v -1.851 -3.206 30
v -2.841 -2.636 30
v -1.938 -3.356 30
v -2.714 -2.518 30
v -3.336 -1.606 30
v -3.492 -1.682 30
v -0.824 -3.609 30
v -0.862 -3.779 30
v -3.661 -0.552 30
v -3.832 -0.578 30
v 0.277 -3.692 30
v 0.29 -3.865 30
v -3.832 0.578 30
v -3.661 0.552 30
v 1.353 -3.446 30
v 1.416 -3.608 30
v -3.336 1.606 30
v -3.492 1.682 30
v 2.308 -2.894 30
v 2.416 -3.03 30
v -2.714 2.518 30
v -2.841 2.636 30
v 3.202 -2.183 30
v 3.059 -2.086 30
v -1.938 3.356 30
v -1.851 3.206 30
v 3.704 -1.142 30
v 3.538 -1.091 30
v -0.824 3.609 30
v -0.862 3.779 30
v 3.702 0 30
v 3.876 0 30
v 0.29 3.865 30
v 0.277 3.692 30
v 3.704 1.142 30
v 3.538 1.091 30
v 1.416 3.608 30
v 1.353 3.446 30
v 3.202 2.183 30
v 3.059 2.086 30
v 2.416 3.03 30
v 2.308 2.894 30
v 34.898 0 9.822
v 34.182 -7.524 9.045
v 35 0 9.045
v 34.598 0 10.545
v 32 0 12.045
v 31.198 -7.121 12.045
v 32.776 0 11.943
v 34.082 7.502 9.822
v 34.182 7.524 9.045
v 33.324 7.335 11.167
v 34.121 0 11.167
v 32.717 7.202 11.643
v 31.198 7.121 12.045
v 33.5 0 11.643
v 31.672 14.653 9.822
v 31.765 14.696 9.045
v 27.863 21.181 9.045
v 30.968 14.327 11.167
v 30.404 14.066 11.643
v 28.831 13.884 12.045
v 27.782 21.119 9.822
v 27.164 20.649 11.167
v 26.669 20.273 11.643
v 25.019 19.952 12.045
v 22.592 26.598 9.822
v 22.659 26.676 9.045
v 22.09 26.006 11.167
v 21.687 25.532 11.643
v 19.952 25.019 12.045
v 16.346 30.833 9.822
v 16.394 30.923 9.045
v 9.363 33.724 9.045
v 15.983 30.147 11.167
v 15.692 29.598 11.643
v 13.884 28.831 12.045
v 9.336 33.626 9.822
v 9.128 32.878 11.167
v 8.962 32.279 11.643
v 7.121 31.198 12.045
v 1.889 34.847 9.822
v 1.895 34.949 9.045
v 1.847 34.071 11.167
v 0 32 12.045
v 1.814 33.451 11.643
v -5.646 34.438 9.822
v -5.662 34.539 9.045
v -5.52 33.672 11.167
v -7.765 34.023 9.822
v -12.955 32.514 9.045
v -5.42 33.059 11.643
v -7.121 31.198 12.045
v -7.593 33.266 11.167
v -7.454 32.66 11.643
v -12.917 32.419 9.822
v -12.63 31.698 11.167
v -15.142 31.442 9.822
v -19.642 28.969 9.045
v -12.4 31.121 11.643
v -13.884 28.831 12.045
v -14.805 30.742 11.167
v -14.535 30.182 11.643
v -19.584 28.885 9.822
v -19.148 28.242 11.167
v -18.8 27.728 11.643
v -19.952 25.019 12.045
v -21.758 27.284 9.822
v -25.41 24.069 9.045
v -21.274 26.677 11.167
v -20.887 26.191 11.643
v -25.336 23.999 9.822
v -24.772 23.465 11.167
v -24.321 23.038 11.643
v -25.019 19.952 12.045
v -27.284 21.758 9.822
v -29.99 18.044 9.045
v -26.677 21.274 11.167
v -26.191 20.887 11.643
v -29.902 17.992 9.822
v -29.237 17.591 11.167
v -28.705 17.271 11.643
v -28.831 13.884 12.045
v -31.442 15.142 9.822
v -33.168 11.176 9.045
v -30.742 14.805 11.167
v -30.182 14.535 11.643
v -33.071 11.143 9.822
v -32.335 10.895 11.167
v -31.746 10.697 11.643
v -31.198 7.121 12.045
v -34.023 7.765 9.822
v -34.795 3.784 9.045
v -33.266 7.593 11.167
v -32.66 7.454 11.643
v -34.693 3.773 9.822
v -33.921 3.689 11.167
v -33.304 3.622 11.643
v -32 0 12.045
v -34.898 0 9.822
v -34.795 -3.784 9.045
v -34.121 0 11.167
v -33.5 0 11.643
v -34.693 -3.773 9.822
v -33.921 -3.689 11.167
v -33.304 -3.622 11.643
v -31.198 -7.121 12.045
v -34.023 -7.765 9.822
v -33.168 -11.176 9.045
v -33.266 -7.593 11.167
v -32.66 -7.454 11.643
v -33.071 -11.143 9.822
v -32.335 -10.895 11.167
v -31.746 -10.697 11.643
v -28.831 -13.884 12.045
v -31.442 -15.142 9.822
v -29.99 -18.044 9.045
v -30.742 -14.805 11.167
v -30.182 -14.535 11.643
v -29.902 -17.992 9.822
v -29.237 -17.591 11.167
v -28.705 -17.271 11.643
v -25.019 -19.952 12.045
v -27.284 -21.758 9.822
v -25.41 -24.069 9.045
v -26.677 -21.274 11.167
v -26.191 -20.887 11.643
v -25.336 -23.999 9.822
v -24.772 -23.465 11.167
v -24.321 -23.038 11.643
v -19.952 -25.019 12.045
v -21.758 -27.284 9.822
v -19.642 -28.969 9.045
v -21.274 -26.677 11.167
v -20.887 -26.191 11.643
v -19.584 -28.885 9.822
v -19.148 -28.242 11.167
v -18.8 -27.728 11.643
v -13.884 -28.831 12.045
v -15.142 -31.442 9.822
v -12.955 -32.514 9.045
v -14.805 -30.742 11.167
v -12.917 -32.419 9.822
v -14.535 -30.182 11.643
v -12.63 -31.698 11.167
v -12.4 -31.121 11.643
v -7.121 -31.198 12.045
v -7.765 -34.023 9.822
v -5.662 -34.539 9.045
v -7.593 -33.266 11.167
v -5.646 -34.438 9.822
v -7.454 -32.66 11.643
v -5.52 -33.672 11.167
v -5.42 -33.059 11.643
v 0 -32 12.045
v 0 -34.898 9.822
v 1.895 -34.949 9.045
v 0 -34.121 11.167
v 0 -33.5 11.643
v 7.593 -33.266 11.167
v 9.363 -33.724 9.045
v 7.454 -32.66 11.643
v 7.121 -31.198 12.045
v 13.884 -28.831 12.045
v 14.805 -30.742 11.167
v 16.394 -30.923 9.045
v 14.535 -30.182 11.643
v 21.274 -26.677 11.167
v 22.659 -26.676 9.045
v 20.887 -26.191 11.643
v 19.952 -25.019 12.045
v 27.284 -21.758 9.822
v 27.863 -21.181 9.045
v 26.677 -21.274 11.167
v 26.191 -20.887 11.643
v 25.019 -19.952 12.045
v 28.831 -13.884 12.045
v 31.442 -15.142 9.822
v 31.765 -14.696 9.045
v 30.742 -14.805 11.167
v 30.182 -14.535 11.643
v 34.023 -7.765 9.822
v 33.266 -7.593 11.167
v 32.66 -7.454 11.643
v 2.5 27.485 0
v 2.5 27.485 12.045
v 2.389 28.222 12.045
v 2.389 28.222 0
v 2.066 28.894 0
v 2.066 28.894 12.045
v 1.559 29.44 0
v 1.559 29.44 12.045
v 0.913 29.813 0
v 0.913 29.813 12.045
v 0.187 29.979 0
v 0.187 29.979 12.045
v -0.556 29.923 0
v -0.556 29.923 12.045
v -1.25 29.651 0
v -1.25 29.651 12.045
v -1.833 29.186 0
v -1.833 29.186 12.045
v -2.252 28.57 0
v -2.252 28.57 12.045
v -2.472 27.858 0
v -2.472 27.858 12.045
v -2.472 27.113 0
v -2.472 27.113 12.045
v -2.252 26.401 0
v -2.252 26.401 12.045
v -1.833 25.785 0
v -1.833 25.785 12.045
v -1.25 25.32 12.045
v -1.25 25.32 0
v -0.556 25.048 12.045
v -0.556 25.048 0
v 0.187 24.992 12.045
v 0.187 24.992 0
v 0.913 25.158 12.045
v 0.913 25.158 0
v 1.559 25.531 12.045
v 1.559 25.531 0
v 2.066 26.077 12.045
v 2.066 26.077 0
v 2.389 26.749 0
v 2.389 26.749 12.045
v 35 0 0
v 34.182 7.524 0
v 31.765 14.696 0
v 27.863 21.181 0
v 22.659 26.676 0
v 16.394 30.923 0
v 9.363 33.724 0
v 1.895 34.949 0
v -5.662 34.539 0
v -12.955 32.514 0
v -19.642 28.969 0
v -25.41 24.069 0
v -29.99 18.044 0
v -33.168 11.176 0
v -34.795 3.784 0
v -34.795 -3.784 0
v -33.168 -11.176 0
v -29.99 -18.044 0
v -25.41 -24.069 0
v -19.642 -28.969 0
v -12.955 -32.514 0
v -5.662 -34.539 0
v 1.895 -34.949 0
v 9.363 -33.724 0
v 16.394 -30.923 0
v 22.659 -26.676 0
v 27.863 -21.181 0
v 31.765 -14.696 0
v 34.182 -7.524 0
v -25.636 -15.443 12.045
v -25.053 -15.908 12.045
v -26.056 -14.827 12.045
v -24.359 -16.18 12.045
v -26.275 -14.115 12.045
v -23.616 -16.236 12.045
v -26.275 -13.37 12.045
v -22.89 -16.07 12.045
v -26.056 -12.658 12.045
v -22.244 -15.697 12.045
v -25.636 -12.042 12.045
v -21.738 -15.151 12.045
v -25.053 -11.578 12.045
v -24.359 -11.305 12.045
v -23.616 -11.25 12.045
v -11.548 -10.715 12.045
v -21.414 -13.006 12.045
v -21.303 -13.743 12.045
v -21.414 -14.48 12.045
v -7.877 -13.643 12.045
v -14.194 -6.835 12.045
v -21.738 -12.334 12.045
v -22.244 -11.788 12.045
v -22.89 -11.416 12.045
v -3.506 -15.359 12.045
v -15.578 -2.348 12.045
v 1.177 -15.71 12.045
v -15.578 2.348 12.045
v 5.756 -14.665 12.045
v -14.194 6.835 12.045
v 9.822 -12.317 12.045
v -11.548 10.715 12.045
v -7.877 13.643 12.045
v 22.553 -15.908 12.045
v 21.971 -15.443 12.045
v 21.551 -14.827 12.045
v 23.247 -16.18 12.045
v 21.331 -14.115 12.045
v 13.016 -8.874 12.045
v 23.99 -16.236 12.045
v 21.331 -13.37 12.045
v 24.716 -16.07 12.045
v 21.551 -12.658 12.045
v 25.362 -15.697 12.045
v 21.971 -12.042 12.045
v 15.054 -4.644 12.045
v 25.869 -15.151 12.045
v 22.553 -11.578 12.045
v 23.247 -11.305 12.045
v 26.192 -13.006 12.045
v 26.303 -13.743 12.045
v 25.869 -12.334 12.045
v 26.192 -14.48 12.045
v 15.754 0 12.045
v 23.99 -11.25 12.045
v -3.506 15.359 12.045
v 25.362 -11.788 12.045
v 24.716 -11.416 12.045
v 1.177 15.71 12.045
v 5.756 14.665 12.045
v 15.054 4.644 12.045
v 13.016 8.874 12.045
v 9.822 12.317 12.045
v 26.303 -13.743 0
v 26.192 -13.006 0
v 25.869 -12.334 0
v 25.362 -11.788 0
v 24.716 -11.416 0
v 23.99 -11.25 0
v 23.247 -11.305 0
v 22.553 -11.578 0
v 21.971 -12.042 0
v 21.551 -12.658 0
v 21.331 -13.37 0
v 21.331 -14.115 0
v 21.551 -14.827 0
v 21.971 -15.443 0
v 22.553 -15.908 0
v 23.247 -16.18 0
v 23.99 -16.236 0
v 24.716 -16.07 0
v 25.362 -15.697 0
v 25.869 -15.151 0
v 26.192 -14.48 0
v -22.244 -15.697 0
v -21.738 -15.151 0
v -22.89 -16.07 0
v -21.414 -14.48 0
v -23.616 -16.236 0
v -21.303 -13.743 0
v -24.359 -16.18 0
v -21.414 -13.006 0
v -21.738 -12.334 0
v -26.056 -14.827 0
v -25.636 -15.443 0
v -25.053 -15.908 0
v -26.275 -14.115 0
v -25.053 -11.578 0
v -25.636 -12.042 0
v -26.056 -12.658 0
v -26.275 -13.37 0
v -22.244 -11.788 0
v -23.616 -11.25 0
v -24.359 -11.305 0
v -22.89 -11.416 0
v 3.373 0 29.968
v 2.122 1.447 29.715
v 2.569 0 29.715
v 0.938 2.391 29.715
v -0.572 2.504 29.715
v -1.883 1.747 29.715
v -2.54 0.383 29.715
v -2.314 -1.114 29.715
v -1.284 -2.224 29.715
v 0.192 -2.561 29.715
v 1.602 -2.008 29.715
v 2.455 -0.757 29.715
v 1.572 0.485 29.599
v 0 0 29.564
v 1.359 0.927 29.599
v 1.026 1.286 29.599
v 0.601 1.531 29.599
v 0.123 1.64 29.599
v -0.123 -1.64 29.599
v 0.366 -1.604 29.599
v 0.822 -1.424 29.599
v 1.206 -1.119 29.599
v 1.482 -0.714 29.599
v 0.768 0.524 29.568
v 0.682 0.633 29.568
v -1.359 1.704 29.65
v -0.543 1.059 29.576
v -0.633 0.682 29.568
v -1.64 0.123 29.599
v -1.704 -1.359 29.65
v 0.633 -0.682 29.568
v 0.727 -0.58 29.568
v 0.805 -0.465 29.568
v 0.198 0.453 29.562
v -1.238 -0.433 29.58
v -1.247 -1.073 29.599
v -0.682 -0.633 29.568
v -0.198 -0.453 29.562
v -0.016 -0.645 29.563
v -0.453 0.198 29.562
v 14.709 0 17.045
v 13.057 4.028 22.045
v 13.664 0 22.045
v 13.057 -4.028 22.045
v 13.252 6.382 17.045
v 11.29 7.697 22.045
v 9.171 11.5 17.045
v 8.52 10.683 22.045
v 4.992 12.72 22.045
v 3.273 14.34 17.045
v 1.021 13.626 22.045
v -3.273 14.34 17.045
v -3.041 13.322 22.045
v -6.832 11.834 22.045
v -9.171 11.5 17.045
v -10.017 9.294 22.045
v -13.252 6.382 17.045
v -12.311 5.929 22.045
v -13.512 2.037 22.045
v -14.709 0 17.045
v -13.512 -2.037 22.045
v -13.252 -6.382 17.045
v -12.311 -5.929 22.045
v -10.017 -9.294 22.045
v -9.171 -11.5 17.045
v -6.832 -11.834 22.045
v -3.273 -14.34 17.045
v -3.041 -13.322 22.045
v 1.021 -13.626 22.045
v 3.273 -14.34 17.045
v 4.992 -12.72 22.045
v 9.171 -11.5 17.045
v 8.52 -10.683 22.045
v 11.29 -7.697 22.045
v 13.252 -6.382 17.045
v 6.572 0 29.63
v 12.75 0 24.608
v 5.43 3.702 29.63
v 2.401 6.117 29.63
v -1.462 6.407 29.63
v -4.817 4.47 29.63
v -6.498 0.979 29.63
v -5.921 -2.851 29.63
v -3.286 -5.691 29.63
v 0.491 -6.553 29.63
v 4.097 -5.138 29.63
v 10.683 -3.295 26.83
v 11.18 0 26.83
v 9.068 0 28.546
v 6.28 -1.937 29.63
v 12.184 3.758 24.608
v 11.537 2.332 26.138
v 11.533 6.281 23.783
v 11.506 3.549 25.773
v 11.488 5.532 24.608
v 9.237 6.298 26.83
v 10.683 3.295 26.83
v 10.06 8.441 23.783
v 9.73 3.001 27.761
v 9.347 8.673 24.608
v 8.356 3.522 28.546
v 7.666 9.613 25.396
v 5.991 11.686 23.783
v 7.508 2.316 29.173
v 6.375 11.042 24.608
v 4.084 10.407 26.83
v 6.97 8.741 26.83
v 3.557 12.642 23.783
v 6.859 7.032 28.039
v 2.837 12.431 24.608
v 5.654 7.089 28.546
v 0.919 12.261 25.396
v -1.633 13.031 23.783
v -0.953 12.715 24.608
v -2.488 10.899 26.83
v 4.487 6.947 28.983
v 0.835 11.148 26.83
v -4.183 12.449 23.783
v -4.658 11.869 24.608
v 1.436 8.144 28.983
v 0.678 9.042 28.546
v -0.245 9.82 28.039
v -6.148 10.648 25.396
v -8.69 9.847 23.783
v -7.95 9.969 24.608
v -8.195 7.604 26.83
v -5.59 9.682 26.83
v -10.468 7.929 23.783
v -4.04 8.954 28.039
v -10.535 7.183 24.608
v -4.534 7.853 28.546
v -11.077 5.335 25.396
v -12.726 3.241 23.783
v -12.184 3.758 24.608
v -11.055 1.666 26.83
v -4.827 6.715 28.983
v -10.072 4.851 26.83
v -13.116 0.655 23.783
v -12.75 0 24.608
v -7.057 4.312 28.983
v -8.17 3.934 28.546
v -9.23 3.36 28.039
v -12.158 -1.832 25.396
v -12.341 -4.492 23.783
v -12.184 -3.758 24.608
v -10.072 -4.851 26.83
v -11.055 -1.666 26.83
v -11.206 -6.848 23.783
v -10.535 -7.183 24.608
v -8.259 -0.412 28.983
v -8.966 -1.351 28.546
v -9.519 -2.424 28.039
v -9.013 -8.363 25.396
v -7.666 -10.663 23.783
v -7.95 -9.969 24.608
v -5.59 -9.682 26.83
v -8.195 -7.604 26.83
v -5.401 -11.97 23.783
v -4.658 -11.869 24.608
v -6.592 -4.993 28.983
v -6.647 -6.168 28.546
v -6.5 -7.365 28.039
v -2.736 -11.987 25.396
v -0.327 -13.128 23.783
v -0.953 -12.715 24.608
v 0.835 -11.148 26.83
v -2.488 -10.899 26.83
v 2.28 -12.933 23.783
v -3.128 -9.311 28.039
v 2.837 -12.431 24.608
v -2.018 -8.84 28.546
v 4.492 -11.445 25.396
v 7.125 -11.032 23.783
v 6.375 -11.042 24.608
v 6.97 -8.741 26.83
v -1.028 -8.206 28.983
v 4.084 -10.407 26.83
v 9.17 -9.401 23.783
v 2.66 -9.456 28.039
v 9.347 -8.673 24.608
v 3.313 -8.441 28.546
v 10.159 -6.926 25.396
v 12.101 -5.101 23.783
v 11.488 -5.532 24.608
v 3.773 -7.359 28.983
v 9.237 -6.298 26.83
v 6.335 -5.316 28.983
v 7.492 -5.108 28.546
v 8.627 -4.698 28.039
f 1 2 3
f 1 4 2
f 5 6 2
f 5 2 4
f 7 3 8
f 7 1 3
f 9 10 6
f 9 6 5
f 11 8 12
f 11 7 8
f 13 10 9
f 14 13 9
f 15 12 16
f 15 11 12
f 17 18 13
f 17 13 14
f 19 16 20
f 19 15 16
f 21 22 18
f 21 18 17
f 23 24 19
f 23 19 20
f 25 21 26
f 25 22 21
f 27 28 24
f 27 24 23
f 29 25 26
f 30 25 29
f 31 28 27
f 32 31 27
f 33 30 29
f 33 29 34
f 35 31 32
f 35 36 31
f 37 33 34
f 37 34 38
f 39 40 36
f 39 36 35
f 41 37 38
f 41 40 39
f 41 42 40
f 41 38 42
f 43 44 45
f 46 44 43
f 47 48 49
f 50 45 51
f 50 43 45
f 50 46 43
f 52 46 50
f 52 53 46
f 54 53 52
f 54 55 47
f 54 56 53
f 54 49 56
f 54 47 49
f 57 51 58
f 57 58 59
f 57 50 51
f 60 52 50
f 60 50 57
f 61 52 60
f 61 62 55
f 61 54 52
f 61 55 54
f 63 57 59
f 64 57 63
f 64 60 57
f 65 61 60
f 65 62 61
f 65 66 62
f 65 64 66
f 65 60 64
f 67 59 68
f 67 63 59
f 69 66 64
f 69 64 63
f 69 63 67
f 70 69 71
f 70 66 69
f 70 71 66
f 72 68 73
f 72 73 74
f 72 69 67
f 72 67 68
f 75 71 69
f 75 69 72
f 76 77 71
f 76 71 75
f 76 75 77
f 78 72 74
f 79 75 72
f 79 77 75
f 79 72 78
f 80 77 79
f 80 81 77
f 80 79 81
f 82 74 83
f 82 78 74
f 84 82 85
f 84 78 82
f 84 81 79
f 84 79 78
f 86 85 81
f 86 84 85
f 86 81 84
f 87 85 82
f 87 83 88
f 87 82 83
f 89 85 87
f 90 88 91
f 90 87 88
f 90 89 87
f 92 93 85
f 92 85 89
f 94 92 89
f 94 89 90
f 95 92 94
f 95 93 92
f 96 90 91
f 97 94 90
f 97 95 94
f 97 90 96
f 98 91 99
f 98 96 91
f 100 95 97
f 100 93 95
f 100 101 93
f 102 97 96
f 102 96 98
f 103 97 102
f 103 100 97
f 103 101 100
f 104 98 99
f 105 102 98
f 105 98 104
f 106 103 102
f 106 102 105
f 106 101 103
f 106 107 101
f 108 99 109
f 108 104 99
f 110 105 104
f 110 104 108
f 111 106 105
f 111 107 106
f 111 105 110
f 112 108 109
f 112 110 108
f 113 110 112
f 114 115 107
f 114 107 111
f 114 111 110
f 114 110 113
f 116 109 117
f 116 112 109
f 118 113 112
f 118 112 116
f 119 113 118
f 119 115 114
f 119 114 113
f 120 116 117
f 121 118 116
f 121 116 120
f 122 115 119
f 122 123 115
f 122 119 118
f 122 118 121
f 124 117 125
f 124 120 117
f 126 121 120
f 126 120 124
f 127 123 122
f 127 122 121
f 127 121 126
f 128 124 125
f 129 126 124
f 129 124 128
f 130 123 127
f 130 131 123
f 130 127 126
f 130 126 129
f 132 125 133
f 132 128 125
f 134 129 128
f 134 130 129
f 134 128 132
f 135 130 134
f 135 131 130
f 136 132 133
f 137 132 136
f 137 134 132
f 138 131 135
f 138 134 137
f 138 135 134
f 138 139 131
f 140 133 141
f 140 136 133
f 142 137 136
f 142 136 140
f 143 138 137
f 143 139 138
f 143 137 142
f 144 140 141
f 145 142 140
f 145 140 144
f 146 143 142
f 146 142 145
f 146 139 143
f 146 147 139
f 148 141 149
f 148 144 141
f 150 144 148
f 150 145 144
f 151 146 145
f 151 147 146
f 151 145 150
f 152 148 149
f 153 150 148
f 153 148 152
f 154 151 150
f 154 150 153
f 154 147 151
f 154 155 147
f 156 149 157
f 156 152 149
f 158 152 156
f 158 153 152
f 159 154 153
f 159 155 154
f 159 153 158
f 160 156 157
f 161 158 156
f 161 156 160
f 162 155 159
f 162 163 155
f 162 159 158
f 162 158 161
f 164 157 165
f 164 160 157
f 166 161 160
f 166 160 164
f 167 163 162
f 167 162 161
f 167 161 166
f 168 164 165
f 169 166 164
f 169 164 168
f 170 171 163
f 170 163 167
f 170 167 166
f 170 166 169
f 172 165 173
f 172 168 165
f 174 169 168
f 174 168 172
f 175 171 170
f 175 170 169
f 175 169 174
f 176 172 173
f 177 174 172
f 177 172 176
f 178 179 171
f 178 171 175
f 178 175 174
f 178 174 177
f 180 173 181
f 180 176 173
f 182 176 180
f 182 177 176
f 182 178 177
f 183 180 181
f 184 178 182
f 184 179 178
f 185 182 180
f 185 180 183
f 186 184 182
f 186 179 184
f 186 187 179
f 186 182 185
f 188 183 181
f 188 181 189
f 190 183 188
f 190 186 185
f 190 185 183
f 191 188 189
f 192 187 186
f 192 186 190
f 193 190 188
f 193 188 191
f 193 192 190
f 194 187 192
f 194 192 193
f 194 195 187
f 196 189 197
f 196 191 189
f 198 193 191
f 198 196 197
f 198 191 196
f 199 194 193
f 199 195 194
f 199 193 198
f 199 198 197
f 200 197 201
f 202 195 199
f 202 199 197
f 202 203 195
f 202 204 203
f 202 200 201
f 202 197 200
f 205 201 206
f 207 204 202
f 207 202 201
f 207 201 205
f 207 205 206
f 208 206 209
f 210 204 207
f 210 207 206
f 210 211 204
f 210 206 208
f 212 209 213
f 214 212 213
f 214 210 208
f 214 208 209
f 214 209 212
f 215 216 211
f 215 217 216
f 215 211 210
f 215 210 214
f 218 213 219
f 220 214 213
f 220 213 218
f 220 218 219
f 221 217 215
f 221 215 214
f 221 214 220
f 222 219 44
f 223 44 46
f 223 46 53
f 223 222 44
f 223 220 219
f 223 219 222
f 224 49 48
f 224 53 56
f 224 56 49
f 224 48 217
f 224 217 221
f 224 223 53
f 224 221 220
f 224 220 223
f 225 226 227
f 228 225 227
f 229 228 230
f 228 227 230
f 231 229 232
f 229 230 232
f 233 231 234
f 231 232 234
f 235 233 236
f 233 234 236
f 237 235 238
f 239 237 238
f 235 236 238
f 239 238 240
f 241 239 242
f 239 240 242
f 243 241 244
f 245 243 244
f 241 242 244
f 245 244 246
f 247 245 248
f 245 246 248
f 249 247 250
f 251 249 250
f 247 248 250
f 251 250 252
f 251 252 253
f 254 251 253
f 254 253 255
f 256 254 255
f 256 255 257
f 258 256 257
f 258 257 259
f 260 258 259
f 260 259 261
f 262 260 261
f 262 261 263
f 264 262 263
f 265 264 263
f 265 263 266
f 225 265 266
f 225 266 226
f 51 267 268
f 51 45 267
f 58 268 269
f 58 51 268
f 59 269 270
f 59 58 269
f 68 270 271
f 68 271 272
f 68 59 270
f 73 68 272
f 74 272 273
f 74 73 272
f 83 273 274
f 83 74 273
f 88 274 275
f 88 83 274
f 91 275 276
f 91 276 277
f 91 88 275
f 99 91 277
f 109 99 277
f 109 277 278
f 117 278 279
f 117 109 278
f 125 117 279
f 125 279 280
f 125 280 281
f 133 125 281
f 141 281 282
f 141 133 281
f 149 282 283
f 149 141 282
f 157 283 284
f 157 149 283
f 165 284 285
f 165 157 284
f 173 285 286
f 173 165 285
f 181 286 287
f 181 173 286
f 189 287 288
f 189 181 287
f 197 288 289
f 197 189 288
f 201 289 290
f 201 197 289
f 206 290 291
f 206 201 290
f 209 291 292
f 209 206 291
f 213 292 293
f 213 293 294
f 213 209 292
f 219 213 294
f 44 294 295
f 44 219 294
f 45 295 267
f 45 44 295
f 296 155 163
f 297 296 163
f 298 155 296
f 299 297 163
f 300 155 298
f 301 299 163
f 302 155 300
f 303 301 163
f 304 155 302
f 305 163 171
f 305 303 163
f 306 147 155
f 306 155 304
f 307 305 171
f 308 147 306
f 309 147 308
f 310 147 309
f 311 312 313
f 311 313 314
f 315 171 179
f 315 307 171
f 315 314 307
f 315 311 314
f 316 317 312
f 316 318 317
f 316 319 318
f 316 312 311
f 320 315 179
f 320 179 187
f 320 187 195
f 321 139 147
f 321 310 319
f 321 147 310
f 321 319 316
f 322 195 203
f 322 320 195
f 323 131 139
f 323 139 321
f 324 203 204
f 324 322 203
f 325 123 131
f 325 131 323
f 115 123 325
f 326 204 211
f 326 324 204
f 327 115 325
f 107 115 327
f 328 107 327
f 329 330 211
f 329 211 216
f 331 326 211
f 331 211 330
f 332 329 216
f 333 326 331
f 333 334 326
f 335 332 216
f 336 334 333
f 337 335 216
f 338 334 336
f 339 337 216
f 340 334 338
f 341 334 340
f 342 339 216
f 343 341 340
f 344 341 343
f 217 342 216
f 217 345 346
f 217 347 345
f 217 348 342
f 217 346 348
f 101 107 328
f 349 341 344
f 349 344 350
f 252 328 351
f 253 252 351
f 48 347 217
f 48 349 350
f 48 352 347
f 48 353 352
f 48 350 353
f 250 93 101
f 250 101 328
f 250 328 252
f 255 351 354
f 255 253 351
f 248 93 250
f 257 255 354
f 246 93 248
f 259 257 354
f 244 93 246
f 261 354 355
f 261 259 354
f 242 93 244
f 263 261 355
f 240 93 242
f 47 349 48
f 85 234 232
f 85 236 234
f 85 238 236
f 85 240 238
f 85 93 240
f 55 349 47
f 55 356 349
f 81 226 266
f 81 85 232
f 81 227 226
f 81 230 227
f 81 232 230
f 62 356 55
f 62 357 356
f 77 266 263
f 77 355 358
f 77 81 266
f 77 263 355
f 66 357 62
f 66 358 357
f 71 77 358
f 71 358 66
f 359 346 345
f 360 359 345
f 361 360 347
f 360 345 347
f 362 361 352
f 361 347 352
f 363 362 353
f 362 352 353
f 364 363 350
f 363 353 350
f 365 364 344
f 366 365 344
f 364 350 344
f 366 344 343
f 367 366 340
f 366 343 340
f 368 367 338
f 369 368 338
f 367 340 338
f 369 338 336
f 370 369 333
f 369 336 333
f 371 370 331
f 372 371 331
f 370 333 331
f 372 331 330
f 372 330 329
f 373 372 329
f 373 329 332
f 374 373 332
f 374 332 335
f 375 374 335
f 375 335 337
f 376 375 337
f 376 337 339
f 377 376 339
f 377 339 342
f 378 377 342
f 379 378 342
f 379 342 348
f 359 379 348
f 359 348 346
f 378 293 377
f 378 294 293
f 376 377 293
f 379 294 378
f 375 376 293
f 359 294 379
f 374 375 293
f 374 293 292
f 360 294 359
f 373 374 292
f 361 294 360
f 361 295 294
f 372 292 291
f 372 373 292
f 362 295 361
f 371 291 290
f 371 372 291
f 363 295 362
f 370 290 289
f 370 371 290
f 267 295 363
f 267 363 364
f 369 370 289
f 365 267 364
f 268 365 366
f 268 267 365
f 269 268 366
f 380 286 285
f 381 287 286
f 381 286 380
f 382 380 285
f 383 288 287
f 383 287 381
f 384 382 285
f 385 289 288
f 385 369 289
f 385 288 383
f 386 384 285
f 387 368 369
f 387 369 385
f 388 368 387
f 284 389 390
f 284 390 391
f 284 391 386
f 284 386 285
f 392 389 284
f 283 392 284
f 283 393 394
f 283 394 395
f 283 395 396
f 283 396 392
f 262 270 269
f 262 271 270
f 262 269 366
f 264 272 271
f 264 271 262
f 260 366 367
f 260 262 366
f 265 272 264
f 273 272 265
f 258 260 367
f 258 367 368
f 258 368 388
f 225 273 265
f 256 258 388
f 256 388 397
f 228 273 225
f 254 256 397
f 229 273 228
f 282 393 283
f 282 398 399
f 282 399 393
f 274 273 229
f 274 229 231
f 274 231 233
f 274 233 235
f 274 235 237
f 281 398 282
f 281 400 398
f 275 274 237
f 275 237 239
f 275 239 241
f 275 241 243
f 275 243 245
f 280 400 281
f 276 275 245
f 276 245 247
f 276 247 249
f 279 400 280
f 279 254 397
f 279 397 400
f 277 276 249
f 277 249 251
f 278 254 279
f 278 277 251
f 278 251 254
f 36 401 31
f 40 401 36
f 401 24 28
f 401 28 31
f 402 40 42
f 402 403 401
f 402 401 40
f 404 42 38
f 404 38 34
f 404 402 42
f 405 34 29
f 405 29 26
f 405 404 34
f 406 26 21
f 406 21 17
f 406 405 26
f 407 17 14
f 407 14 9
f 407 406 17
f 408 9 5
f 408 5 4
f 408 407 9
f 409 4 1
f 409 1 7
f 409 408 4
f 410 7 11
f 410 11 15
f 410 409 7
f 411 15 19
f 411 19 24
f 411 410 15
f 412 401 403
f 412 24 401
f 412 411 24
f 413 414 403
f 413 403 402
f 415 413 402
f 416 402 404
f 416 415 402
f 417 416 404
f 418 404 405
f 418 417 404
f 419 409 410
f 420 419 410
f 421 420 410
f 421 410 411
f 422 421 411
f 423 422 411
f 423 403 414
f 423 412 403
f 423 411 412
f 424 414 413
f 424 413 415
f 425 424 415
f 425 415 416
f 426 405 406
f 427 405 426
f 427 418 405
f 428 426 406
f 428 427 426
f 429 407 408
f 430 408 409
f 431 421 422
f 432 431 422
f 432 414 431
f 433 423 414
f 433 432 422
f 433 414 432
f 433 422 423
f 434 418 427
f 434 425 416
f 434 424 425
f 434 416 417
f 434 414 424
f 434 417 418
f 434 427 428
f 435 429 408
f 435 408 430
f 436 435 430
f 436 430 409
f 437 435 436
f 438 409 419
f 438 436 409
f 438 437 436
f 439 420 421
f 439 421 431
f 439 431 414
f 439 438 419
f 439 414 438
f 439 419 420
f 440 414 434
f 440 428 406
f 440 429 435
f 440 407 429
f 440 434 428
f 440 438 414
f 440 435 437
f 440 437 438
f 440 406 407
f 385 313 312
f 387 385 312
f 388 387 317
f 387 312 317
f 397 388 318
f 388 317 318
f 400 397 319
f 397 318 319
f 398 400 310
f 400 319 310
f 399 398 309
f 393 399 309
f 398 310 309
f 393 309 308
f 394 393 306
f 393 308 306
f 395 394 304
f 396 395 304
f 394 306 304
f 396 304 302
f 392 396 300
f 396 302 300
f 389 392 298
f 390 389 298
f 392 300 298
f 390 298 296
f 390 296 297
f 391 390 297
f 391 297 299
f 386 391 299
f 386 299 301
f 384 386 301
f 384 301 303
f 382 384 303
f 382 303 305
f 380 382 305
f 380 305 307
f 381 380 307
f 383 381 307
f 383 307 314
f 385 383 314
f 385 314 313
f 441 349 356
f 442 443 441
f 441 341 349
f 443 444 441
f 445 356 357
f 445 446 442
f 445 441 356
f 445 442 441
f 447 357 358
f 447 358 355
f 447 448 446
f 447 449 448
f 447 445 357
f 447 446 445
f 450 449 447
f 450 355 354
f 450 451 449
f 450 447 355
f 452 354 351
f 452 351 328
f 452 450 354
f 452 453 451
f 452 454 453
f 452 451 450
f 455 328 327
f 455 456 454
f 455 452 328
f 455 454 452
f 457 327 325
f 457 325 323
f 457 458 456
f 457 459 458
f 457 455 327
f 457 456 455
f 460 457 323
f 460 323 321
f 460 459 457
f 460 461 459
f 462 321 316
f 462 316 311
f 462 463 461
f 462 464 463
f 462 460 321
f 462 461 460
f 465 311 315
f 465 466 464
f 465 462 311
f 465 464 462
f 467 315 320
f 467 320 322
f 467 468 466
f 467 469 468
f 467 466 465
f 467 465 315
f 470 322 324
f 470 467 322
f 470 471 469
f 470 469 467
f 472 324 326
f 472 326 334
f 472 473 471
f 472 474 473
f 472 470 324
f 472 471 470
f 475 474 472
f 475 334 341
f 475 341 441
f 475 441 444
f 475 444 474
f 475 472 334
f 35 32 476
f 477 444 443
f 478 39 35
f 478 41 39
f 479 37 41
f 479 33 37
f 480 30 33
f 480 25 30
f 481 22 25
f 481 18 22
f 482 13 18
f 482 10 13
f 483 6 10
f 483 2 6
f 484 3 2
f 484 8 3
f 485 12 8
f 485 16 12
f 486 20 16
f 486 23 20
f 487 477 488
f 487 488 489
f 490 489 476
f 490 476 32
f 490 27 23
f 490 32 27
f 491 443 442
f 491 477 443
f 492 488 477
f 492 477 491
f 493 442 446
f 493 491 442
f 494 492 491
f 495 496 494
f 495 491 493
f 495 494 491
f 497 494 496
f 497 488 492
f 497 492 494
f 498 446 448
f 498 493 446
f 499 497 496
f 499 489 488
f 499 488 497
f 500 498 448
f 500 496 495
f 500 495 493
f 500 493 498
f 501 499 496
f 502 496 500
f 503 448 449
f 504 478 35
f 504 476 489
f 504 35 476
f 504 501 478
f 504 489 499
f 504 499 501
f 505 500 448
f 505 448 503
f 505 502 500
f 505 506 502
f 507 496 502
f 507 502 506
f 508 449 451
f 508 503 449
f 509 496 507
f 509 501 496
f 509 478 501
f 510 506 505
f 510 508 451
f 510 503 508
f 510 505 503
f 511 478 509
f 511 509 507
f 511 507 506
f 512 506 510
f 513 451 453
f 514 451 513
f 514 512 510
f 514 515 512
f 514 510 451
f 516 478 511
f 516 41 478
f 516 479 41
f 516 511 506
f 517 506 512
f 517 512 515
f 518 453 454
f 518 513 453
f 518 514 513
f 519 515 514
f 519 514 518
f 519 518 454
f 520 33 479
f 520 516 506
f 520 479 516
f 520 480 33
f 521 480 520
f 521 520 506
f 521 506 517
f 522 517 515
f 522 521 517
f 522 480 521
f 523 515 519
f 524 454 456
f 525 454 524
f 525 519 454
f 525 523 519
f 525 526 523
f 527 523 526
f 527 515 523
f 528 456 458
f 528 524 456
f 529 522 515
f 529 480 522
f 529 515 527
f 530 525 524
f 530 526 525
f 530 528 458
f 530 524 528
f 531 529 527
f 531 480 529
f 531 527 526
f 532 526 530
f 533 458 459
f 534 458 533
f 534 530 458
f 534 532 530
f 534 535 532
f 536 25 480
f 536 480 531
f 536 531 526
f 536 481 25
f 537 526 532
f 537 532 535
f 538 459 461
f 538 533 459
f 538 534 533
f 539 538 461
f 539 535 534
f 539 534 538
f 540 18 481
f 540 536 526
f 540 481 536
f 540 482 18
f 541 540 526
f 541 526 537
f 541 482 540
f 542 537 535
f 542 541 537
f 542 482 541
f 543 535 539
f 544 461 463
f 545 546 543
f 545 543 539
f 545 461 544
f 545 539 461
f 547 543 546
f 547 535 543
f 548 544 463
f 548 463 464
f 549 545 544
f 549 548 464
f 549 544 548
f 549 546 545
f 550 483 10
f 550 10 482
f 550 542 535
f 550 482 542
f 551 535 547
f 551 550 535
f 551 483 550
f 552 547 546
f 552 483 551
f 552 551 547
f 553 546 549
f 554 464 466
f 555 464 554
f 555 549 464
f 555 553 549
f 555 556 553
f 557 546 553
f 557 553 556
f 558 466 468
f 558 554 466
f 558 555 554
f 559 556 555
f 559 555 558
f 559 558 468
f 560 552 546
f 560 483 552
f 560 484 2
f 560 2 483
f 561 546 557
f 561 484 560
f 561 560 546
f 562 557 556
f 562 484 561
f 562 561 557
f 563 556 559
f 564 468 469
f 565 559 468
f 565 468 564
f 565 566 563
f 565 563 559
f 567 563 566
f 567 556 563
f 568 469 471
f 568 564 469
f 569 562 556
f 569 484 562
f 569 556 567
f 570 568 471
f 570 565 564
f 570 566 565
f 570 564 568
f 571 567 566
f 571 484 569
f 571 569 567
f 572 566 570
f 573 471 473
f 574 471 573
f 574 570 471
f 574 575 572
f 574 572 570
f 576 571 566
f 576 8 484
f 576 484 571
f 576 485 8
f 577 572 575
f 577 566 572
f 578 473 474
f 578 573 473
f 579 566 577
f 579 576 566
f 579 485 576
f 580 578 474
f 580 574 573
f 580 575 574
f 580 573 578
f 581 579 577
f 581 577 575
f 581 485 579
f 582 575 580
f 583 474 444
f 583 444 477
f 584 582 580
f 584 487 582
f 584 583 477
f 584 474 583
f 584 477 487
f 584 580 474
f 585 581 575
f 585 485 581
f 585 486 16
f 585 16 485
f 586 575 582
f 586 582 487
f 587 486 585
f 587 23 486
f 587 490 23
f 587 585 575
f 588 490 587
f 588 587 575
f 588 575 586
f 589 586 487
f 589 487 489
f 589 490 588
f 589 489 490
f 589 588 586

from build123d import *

# Parameters (mm, degrees)
F2_R     = 2.5
F3_DEPTH = 25
F4_R     = 5
F5_DEPTH = 29


with BuildPart() as f1:
    # F0 (on Front) → F1 (revolve)
    with BuildSketch(Plane.XZ):
        with BuildLine():
            Line((0, 29.563617), (0, 0))
            Line((0, 0), (35, 0))
            Line((35, 0), (35, 9.045376))
            ThreePointArc((35, 9.045376), (34.12132, 11.166697), (32, 12.045376))
            Line((32, 12.045376), (15.753854, 12.045376))
            Line((15.753854, 12.045376), (13.664301, 22.045376))
            ThreePointArc((13.664301, 22.045376), (10.182308, 27.760598), (3.875714, 30))
            Line((3.875714, 30), (3.702194, 30))
            add(Edge.make_bspline(
                [(3.702194, 30), (2.872247, 30.008527), (3.357668, 29.526608), (0, 29.563617)],
                knots=[0, 0, 0, 0, 3.727824, 3.727824, 3.727824, 3.727824], degree=3))
        make_face()
    revolve(axis=Axis((0, 0, 14.781808), (0, 0, 1)))

    # F2 (on face) → F3 (cut)
    with BuildSketch(Plane.XY.offset(12.045376)):
        with Locations((0, 27.485492)):
            Circle(F2_R)
        with Locations((23.803134, -13.742746)):
            Circle(F2_R)
        with Locations((-23.803134, -13.742746)):
            Circle(F2_R)
    extrude(amount=-F3_DEPTH, mode=Mode.SUBTRACT)

    # F4 (on face) → F5 (join)
    with BuildSketch(Plane(origin=(0, 0, 0), x_dir=(1, 0, 0), z_dir=(0, 0, -1))):
        Circle(F4_R)
    extrude(amount=-F5_DEPTH)


solid = f1.part
